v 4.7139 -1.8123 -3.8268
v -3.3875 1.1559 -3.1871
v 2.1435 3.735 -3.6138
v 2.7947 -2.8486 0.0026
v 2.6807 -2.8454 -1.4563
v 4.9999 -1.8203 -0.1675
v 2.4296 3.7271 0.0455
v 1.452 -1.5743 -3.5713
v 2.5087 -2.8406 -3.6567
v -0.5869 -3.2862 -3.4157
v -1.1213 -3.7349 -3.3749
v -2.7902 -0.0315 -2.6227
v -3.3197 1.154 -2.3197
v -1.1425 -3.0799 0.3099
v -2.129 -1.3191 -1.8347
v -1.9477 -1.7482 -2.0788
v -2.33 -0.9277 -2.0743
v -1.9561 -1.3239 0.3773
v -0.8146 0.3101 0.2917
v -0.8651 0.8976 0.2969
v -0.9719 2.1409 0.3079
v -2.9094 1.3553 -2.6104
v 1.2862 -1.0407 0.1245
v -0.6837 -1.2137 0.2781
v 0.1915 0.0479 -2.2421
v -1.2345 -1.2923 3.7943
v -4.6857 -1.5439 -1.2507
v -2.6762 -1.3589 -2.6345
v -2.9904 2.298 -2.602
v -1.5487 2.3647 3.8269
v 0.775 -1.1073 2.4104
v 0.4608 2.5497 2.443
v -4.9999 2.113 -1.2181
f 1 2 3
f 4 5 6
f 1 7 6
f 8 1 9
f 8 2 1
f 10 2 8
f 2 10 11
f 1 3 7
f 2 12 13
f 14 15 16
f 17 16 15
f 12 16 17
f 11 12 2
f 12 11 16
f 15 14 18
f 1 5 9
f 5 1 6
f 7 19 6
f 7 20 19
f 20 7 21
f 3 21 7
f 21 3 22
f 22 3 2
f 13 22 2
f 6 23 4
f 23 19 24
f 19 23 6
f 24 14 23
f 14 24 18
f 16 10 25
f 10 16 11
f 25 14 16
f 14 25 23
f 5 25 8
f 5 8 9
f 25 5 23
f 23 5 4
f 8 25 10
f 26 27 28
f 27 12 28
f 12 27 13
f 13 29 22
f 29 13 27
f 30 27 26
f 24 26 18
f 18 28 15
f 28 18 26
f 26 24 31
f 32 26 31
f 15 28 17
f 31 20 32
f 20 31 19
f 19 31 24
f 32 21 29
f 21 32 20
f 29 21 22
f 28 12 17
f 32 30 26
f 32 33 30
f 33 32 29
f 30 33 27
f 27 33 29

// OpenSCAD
intersection() {
  translate([-5e-06, 1e-05, 1.5e-05])
  cube(size = [11.9999, 8.96419, 9.18457], center = true);

  union() {
    union() {
      difference() {
        translate([0.806225, -0.332184, -1.67729])
        rotate([-178, 4.00022, 25])
        cube(size = [6.11766, 6.11761, 3.6705], center = true);
      
        translate([1.4069, -16.0324, 2.22933])
        rotate([-147.032, 3.34625, 40.017])
        cube(size = [19.308, 17.7151, 20.8221], center = true);
      }
    
      difference() {
        translate([-2.11245, 0.502873, 0.596159])
        rotate([90.6156, 34.4411, 5.25889])
        cube(size = [2.44695, 6.11766, 3.67057], center = true);
      
        translate([3.44853, 10.4444, -11.5032])
        rotate([-178, 4.00022, 25])
        cube(size = [21.353, 22.7572, 15.5561], center = true);
      }
    }
  }
}
